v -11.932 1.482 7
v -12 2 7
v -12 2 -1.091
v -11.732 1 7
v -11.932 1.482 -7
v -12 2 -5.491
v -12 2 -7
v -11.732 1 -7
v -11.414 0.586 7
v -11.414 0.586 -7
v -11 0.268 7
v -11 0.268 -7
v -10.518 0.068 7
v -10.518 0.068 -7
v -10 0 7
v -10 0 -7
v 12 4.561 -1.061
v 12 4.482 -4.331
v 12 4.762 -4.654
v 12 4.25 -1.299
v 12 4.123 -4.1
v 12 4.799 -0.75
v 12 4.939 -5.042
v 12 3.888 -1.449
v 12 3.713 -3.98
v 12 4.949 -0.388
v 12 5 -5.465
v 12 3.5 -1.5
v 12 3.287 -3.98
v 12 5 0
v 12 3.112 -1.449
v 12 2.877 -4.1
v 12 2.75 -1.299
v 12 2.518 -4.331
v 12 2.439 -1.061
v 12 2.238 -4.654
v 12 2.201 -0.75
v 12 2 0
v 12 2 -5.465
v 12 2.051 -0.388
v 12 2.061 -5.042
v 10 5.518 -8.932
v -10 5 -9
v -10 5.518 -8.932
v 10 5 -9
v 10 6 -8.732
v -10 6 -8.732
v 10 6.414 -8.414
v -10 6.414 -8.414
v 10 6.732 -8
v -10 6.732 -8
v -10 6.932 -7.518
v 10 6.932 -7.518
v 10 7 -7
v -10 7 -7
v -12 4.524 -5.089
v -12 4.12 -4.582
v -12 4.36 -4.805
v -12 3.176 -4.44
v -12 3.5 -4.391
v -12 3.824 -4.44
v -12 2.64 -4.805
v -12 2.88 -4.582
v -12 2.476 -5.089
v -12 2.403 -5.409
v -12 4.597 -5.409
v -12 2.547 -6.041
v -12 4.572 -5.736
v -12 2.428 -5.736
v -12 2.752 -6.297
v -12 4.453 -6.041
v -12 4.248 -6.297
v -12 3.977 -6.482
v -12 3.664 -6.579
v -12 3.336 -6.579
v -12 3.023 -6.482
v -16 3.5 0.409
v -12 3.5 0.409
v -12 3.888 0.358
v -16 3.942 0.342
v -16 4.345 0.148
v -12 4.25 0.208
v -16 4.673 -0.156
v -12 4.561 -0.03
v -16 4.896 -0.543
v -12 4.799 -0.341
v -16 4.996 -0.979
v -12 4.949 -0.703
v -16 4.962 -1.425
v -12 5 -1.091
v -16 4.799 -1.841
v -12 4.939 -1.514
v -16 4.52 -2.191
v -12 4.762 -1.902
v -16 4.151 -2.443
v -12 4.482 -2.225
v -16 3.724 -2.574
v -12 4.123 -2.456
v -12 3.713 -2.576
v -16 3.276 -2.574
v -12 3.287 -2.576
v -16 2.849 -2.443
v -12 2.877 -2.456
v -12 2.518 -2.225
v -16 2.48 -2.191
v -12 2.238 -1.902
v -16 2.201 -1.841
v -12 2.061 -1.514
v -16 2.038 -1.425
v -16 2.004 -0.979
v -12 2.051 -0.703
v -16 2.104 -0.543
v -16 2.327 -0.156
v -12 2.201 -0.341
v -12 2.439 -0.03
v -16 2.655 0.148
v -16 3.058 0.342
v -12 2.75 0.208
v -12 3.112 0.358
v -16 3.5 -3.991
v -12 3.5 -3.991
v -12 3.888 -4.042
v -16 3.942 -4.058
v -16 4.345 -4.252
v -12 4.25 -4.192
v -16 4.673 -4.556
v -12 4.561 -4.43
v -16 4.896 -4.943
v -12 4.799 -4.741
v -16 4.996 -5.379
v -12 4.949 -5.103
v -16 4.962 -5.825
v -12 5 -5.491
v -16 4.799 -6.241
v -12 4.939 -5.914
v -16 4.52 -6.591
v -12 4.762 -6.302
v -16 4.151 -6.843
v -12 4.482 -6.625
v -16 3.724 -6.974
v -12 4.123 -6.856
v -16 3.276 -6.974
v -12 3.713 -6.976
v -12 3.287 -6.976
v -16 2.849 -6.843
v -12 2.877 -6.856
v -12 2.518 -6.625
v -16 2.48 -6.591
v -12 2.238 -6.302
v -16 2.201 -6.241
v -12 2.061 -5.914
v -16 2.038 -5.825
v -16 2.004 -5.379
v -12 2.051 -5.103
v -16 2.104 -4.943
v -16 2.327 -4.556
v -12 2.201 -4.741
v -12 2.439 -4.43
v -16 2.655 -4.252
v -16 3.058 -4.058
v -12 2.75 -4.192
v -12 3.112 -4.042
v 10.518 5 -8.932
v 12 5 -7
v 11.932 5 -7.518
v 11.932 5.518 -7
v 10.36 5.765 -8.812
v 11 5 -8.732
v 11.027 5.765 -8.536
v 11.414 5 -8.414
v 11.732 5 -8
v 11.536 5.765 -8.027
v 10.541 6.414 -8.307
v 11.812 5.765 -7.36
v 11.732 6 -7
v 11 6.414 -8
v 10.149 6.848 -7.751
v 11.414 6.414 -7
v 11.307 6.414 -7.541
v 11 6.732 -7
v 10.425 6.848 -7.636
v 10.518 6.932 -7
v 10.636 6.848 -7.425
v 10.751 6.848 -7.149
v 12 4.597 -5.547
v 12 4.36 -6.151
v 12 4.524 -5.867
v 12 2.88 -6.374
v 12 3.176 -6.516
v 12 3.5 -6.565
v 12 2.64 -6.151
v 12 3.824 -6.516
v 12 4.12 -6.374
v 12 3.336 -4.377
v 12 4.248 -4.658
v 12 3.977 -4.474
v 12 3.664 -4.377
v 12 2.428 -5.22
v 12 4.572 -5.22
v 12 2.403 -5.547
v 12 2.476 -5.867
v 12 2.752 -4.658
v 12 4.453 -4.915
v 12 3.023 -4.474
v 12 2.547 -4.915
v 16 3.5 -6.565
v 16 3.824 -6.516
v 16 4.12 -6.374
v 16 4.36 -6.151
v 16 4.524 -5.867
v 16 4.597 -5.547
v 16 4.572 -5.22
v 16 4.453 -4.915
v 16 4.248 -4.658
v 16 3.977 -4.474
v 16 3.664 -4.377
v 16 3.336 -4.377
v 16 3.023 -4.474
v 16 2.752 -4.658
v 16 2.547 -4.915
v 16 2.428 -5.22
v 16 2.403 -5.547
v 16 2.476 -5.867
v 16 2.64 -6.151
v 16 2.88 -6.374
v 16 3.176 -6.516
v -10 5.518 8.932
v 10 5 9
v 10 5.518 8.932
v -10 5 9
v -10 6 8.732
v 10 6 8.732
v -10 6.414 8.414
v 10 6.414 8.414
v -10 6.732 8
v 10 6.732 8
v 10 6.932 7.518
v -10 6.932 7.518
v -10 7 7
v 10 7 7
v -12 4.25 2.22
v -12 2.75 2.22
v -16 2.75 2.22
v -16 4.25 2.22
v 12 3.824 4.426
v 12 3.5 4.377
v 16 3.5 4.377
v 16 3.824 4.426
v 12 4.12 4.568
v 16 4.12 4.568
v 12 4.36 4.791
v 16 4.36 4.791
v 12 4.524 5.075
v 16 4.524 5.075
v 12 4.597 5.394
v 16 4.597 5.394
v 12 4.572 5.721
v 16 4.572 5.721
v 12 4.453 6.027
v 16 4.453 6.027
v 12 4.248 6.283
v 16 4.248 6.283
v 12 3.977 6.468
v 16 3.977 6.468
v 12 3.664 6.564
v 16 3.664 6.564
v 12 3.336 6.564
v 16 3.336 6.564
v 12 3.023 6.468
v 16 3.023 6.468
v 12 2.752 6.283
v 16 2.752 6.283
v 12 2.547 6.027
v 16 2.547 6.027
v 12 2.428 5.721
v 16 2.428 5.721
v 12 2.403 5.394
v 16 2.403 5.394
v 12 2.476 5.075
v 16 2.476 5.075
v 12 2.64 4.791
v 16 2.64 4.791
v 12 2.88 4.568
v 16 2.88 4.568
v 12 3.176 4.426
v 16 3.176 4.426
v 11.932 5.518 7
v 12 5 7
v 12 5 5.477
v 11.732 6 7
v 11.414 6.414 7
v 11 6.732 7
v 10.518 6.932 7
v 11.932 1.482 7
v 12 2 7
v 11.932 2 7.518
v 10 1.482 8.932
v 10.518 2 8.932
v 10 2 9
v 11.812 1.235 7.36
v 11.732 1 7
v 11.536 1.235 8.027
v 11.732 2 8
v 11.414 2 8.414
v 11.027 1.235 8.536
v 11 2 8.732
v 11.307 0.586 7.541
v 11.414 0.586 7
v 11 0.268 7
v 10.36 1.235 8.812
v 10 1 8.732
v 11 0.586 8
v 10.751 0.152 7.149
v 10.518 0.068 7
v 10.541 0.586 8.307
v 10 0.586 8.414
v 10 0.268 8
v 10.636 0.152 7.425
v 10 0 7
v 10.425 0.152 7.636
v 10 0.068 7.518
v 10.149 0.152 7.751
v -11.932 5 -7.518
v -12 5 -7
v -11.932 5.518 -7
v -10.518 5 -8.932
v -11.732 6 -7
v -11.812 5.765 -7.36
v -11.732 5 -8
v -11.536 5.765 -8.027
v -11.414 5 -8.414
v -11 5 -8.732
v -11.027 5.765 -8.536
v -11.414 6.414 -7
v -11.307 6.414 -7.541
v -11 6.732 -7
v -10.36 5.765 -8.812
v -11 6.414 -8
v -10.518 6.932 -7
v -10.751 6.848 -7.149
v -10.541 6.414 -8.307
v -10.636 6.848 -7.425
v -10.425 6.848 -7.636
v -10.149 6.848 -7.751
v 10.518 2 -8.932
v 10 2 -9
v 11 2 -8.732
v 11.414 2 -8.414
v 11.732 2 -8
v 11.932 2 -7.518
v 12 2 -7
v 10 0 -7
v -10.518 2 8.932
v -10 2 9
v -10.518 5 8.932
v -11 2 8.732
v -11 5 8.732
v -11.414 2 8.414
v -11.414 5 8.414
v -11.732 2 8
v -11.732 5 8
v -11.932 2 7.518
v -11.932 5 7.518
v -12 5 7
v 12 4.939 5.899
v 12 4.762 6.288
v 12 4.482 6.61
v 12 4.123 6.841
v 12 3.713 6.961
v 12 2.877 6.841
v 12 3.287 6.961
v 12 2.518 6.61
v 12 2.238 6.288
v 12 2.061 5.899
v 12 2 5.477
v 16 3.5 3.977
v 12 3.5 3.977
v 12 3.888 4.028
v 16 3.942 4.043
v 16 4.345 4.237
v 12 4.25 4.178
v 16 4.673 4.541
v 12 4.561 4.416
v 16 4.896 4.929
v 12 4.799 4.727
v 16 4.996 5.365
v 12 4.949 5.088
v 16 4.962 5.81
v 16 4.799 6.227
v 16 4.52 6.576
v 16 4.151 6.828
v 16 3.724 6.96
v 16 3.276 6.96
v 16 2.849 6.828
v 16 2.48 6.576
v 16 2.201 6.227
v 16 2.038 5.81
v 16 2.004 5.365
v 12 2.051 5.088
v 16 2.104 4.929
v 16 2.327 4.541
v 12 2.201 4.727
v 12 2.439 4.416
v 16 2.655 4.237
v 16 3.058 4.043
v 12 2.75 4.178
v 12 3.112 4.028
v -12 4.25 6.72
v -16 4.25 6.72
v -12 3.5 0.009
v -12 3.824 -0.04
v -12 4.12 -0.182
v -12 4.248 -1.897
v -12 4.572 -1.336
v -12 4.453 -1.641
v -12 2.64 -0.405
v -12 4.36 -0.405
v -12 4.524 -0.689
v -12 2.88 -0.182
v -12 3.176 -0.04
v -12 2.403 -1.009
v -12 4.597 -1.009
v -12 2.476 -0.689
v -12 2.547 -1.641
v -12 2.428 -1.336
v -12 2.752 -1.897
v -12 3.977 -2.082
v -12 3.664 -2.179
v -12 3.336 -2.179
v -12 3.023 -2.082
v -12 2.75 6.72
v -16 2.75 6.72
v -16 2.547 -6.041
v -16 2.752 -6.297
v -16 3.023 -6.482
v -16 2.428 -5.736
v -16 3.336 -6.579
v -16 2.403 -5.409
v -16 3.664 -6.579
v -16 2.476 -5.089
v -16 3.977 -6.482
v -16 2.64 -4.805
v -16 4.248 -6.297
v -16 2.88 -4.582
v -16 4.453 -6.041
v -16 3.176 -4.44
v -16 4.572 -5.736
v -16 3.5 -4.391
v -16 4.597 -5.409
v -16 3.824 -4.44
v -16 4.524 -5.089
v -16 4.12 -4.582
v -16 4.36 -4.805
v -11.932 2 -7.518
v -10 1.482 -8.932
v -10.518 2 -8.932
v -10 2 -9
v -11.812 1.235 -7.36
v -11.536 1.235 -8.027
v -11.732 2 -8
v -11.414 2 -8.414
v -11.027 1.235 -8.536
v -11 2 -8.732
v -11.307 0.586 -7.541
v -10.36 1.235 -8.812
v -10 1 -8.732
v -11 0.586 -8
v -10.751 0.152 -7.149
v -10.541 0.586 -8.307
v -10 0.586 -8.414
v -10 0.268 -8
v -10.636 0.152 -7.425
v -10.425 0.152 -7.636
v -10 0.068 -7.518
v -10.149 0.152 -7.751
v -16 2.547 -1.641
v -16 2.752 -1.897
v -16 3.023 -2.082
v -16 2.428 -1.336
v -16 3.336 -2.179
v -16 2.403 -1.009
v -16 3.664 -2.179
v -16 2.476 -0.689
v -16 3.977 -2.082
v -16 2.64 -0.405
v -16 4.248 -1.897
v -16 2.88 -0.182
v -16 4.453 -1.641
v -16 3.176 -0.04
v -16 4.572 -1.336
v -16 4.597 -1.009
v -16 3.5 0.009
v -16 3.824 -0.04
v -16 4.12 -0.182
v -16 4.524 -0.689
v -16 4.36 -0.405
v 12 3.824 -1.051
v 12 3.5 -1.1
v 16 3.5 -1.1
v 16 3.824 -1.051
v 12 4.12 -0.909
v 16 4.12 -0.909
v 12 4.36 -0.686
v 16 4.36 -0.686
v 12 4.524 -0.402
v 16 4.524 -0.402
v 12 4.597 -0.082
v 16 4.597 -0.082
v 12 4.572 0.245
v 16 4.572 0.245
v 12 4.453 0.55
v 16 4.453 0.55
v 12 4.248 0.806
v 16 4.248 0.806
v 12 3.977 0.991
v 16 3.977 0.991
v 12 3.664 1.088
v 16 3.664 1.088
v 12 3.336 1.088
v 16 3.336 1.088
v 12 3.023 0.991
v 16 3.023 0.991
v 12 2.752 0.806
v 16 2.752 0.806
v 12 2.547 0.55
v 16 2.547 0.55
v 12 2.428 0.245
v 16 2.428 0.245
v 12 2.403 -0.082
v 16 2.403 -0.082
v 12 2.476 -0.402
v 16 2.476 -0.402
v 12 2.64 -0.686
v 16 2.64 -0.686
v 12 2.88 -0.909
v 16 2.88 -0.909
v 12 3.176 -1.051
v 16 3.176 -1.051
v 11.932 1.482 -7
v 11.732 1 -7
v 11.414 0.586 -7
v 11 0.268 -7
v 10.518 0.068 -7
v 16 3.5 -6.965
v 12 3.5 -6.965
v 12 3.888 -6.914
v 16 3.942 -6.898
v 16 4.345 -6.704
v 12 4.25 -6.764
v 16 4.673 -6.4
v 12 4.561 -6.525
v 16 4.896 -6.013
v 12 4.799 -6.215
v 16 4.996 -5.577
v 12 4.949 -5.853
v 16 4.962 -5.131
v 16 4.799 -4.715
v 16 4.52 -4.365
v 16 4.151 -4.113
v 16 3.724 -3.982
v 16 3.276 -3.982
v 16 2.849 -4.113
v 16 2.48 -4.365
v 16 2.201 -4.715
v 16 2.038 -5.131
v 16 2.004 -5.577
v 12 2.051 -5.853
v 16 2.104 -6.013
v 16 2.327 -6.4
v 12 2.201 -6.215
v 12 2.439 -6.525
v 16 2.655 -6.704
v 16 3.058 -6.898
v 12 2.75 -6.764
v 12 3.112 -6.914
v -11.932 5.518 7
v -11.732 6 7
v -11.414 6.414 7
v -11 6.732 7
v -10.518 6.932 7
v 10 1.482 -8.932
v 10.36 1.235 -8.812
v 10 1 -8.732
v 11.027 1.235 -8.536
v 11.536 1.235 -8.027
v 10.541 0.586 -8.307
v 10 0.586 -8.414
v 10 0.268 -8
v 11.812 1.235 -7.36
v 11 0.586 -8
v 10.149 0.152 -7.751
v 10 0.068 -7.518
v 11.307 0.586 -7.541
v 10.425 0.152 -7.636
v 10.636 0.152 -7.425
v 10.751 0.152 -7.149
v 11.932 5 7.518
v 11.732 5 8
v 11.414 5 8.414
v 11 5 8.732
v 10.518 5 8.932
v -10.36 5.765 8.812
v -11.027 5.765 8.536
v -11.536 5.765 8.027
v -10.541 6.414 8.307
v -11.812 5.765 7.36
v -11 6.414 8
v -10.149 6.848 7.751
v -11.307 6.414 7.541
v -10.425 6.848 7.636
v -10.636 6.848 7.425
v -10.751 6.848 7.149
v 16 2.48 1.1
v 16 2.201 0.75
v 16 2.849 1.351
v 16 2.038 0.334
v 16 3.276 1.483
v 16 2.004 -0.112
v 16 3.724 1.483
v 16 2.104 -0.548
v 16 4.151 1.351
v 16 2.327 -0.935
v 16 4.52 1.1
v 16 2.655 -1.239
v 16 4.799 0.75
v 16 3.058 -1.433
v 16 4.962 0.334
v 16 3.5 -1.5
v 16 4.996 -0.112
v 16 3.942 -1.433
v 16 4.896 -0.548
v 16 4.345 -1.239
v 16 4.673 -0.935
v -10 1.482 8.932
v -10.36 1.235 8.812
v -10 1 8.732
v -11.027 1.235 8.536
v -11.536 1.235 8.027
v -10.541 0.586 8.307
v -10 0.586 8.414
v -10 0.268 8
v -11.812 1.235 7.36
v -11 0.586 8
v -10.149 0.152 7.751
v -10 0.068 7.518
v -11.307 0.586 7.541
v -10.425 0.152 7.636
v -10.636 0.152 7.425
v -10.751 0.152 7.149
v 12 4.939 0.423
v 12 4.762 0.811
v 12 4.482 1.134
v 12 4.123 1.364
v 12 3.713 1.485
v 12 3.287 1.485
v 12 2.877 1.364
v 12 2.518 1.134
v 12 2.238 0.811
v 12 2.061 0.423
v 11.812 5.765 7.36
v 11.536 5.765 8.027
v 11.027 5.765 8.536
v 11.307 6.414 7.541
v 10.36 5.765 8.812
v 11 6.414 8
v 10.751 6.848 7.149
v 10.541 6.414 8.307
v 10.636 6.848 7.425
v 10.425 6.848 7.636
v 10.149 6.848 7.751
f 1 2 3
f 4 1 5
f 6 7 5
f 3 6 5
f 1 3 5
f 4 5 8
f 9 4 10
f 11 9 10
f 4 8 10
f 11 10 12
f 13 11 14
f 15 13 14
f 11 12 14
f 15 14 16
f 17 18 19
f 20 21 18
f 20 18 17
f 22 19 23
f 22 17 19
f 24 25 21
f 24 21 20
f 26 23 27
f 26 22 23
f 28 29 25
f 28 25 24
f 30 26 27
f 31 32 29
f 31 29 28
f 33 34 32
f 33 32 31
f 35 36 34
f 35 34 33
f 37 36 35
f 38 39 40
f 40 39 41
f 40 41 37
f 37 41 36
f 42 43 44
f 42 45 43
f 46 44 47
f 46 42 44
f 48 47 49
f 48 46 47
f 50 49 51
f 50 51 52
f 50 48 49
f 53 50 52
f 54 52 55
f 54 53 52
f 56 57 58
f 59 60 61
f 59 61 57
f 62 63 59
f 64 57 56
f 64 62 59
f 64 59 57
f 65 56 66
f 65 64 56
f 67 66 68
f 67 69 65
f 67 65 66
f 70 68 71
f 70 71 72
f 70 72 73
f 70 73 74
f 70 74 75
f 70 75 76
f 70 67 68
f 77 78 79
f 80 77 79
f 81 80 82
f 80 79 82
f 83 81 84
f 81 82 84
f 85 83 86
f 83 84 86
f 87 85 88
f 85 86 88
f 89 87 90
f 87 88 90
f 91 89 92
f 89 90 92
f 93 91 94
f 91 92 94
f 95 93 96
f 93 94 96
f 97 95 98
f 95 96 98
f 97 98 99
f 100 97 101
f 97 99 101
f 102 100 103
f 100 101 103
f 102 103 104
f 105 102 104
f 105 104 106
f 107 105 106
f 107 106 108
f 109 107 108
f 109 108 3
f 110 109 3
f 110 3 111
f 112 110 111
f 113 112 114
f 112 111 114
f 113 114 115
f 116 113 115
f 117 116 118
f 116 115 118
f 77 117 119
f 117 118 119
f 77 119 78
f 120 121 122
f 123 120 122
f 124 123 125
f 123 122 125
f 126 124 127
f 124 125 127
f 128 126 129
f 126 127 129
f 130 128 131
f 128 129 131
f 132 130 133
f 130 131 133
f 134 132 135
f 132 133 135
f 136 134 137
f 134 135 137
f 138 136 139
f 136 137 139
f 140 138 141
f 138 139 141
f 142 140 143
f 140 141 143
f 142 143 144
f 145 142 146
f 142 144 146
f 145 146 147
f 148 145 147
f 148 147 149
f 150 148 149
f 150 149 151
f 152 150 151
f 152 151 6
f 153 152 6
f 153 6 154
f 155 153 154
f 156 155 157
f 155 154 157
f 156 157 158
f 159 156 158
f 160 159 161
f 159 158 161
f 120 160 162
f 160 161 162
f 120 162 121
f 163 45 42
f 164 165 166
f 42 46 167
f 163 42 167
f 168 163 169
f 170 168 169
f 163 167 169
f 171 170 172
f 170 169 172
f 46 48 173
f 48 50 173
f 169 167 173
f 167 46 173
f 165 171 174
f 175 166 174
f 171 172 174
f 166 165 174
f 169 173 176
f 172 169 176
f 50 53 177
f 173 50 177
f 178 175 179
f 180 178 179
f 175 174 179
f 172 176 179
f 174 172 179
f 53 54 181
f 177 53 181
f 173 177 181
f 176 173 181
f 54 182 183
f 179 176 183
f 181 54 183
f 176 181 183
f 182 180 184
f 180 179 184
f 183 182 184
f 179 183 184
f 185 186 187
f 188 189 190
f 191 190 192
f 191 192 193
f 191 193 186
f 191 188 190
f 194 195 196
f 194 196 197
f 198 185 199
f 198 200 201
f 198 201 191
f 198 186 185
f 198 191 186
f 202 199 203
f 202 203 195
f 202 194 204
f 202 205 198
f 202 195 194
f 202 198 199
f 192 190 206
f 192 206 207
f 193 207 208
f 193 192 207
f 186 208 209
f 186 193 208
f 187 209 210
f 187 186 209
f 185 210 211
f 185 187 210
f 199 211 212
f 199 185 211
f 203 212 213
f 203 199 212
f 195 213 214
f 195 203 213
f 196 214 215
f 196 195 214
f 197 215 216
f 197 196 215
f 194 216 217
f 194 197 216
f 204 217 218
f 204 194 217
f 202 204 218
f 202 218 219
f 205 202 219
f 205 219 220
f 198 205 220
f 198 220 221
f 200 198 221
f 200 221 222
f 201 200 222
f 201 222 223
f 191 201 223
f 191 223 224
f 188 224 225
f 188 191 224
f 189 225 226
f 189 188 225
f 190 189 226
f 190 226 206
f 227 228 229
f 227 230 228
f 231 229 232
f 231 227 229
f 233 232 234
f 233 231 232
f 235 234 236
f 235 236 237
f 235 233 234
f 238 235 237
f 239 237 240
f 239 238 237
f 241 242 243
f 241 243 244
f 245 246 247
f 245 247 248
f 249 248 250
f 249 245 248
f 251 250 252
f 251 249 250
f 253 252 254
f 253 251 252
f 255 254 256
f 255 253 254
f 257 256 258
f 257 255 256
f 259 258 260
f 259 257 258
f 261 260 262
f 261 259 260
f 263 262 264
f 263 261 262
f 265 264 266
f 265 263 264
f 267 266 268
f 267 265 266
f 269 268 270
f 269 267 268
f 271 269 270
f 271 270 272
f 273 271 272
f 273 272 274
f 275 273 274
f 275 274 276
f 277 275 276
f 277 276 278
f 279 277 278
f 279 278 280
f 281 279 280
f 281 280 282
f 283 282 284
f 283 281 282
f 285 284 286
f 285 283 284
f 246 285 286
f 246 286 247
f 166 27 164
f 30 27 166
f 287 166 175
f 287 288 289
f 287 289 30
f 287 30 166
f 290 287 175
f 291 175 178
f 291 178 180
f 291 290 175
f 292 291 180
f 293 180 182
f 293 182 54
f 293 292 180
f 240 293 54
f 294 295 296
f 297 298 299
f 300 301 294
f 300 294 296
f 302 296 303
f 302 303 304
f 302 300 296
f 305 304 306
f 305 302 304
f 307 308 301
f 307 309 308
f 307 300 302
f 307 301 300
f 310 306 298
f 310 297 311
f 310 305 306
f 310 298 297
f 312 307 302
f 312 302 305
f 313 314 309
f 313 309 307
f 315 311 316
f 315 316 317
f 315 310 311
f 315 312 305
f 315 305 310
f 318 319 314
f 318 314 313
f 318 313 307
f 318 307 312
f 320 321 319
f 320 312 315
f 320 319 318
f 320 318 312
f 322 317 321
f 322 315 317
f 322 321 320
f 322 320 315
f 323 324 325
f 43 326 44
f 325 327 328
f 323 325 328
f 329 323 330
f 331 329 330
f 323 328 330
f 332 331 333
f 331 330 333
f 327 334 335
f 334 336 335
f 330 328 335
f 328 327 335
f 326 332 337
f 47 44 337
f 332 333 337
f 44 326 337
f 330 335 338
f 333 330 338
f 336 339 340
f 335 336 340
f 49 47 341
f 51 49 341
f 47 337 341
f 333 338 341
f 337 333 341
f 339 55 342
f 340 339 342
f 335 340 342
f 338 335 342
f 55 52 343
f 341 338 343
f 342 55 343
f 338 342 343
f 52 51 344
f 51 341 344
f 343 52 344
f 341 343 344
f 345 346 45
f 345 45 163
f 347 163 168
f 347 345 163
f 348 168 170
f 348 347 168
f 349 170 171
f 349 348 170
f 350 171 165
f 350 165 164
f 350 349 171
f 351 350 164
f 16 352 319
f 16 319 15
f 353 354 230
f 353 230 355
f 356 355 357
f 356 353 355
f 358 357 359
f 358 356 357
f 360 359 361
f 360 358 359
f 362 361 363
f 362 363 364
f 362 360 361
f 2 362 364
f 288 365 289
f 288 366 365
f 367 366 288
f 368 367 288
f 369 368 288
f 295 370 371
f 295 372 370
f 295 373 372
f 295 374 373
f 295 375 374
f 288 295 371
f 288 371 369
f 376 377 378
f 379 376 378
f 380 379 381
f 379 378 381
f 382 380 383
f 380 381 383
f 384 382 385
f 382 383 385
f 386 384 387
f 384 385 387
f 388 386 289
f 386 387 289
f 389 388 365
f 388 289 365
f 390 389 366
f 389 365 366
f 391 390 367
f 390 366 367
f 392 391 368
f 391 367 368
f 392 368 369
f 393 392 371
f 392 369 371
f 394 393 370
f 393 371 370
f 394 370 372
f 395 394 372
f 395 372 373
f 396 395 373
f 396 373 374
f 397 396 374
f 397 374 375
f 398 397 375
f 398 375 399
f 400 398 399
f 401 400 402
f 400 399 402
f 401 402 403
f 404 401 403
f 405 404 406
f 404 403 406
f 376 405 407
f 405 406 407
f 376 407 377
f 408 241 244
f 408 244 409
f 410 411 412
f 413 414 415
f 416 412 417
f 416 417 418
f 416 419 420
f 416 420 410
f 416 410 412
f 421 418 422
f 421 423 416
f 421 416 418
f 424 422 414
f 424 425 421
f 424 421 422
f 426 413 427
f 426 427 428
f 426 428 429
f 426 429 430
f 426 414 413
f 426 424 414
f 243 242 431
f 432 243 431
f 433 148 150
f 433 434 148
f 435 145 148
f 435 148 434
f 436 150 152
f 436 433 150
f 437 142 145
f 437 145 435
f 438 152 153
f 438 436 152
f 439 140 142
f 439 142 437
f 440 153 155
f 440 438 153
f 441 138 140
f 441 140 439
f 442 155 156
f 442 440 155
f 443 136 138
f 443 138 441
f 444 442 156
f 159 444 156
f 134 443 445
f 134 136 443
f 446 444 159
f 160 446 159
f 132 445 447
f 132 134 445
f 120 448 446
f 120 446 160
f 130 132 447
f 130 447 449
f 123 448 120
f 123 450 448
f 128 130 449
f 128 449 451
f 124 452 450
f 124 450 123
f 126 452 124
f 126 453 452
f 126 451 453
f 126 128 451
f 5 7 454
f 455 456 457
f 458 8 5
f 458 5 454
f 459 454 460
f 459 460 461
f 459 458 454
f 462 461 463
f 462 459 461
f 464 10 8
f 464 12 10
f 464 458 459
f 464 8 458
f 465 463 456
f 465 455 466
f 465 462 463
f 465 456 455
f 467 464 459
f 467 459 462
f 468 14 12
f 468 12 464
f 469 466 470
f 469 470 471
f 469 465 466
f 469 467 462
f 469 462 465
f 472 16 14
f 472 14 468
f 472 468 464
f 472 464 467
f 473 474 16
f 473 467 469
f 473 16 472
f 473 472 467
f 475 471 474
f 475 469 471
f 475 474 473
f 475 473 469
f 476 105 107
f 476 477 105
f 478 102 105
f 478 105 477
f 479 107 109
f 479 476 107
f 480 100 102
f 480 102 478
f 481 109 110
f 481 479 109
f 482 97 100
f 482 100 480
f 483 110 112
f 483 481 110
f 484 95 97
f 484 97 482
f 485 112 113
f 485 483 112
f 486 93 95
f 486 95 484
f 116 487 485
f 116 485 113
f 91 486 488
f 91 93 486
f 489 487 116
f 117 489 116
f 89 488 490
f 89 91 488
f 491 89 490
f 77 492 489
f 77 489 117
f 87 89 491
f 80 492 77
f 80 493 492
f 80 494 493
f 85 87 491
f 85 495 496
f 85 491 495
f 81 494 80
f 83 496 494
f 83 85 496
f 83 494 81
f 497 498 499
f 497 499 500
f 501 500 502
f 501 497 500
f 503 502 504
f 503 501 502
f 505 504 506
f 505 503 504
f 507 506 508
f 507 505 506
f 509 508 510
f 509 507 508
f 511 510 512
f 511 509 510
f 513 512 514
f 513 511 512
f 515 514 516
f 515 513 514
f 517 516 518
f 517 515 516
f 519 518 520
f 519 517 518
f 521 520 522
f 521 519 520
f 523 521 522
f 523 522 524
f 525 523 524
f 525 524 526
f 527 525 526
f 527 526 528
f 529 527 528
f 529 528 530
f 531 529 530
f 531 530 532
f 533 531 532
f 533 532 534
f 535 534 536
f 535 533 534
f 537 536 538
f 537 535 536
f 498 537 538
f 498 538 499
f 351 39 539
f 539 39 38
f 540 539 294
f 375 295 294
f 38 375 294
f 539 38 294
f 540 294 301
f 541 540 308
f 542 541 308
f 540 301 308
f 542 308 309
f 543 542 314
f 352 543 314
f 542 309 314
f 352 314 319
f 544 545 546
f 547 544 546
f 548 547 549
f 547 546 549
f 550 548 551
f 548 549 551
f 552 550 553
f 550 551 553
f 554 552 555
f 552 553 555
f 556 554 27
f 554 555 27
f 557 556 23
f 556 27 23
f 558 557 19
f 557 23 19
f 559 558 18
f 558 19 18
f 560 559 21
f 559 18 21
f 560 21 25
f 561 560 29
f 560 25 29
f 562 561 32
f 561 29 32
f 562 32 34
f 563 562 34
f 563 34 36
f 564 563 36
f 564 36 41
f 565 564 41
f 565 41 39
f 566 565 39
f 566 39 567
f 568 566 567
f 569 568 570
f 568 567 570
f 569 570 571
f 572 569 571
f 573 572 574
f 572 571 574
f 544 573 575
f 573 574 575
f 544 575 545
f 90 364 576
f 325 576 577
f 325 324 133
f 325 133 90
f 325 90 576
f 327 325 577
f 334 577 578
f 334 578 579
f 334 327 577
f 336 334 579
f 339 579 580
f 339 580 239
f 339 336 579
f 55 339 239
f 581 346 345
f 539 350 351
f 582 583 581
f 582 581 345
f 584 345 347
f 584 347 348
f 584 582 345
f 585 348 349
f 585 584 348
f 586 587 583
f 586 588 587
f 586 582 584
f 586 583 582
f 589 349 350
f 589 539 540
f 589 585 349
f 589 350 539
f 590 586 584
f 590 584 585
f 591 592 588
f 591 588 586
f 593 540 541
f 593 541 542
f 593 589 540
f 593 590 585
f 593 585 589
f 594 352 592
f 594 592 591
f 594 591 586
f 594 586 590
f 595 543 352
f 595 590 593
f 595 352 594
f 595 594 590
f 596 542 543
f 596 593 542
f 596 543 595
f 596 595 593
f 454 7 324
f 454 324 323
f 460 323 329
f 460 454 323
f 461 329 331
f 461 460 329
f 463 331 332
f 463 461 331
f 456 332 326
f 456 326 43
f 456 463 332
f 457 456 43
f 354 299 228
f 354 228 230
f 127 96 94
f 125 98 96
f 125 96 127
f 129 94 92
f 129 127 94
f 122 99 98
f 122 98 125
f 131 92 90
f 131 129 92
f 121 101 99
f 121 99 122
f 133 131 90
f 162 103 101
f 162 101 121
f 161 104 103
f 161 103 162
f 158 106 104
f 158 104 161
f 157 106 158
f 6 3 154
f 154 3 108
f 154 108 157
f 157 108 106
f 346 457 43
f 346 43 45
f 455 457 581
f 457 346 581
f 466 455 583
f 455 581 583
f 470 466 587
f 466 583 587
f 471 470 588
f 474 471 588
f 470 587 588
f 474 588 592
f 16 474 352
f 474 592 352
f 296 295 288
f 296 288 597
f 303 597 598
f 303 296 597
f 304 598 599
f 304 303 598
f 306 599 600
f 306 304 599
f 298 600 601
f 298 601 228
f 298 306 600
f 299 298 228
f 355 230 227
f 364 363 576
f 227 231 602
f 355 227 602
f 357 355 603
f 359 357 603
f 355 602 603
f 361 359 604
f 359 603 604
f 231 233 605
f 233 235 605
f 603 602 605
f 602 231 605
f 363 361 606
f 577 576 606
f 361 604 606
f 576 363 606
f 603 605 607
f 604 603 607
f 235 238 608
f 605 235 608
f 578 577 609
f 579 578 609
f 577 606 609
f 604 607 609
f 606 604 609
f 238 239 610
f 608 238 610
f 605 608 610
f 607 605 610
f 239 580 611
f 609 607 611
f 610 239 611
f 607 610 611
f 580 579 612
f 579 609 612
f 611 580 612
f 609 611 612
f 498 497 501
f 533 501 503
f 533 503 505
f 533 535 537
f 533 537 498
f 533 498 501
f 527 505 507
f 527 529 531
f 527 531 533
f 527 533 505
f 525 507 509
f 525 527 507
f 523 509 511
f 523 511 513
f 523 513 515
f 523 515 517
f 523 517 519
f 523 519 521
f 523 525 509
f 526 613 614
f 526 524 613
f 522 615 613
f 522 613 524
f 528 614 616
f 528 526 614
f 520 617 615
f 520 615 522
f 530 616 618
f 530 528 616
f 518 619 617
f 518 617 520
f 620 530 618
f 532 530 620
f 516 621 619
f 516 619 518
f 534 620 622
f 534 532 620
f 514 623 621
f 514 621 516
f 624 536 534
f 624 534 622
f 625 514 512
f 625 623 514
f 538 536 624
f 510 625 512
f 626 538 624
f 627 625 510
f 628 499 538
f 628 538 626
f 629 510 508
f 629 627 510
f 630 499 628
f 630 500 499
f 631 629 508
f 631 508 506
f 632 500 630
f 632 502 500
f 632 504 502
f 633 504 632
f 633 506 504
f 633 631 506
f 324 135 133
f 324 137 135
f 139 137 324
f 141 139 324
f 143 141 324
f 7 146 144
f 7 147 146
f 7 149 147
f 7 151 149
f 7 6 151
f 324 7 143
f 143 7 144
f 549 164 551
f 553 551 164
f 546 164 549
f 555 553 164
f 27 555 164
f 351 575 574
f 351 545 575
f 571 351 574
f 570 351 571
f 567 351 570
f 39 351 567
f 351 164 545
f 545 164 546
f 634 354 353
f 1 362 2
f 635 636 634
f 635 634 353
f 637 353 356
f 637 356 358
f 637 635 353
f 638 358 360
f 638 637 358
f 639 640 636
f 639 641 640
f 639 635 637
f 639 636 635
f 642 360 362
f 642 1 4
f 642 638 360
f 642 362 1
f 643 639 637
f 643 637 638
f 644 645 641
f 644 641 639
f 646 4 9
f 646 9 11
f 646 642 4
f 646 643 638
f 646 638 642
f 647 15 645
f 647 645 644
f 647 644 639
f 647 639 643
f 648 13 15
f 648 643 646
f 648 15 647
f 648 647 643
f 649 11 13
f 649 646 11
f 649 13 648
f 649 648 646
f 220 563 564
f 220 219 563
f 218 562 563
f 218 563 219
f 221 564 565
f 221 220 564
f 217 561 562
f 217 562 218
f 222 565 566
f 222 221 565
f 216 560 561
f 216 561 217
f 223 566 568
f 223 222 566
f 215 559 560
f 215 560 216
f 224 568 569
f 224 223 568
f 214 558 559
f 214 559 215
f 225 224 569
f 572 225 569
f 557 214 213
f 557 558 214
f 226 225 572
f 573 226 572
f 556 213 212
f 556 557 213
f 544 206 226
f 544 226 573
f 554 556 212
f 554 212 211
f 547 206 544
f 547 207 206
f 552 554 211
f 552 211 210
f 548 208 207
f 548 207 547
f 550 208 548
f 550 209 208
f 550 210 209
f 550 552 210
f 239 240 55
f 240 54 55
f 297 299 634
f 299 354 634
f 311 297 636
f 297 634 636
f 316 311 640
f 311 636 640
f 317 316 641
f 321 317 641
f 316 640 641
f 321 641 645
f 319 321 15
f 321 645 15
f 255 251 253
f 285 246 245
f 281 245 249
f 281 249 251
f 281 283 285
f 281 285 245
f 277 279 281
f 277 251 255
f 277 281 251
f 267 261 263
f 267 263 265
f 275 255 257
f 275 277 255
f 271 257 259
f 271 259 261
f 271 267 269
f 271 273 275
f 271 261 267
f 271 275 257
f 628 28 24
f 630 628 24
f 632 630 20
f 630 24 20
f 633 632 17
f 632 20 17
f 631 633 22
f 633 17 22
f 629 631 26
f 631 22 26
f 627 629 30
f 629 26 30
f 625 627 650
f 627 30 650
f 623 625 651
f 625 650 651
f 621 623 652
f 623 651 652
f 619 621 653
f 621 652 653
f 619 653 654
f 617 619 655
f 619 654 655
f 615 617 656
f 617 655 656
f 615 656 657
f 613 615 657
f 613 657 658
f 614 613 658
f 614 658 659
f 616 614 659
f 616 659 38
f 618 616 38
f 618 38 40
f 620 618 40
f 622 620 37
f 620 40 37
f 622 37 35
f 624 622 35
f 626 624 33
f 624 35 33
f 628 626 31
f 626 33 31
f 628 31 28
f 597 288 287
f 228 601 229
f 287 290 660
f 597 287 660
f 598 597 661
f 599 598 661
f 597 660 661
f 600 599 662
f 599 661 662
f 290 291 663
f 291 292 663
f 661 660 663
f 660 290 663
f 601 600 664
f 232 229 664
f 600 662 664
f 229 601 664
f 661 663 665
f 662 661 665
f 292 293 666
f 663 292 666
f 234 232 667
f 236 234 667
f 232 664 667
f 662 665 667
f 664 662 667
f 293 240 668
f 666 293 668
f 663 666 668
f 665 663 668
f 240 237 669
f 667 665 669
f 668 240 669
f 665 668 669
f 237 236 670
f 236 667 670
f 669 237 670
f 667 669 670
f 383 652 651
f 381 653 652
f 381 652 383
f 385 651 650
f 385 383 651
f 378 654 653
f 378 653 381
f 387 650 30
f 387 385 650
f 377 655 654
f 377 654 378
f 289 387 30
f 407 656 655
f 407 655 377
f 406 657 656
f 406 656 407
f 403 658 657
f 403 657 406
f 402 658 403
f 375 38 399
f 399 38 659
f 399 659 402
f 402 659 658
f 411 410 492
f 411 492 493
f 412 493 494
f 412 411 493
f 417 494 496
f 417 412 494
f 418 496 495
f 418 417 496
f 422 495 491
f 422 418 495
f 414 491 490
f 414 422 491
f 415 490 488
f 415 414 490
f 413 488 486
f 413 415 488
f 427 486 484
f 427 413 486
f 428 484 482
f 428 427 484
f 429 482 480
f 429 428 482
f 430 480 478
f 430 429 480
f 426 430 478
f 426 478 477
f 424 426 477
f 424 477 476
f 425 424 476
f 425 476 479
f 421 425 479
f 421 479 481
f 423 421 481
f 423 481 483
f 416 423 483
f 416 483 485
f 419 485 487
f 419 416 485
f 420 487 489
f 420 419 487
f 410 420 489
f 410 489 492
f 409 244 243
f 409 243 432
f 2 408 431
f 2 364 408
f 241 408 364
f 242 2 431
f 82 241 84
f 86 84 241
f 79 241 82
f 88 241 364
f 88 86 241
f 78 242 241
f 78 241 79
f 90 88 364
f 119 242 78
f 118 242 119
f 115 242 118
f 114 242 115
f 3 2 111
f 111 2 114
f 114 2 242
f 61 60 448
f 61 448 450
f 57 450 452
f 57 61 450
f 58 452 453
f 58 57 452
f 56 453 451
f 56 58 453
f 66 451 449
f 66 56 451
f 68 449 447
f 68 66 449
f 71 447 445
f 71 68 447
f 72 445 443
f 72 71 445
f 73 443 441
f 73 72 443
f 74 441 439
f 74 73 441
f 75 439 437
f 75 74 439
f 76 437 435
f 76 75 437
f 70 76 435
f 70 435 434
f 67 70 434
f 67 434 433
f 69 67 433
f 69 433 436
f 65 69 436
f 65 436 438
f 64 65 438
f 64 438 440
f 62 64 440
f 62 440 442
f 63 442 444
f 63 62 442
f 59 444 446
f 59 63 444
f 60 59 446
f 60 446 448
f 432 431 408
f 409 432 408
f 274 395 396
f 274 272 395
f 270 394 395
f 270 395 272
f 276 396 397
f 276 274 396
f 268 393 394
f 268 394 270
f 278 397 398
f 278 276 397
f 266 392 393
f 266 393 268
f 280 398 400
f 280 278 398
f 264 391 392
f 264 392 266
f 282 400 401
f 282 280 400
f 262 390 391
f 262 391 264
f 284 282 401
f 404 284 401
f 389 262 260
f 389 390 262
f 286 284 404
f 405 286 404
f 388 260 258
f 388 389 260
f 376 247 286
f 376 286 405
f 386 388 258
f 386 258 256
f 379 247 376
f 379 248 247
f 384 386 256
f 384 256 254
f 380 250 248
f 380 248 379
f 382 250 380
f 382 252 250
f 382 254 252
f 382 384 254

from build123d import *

# Parameters (mm, degrees)
BOSS_EXTRUDE1_DEPTH = 7
FILLET1_R           = 2
SKETCH2_R           = 1.5
SKETCH2_R_2         = 1.1
BOSS_EXTRUDE2_DEPTH = 4
SKETCH3_R           = 1.5
SKETCH3_R_2         = 1.1
SKETCH3_W           = 4.5
SKETCH3_H           = 1.5
BOSS_EXTRUDE3_DEPTH = 4


with BuildPart() as part:
    # Sketch1 → Boss-Extrude1 (new body)
    with BuildSketch(Plane(origin=(0, 0, 0), x_dir=(1, 0, 0), z_dir=(0, 1, 0))):
        with BuildLine():
            Line((10, -9), (-10, -9))
            ThreePointArc((-10, -9), (-11.414213562, -8.414213562), (-12, -7))
            Line((-12, -7), (-12, 7))
            ThreePointArc((-12, 7), (-11.414213562, 8.414213562), (-10, 9))
            Line((-10, 9), (10, 9))
            ThreePointArc((10, 9), (11.414213562, 8.414213562), (12, 7))
            Line((12, 7), (12, -7))
            ThreePointArc((12, -7), (11.414213562, -8.414213562), (10, -9))
        make_face()
    extrude(amount=BOSS_EXTRUDE1_DEPTH)

    # Fillet1
    fillet1_edges = [part.edges().sort_by_distance(p)[0] for p in [
        (12, 0, 0),
        (11.414213562, 0, 8.414213562),
        (0, 0, 9),
        (-11.414213562, 0, 8.414213562),
        (11.414213562, 7, 8.414213562),
        (12, 7, 0),
        (11.414213562, 7, -8.414213562),
        (0, 7, -9),
        (-11.414213562, 7, -8.414213562),
        (-12, 7, 0),
        (-11.414213562, 7, 8.414213562),
        (-12, 0, 0),
        (0, 7, 9),
        (-11.414213562, 0, -8.414213562),
        (0, 0, -9),
        (11.414213562, 0, -8.414213562),
    ]]
    fillet(fillet1_edges, radius=FILLET1_R)

    # Sketch2 → Boss-Extrude2 (add)
    with BuildSketch(Plane(origin=(12, 0, 0), x_dir=(0, 0, -1), z_dir=(1, 0, 0))):
        with Locations((0, 3.5)):
            Circle(SKETCH2_R)
        with Locations((0, 3.5)):
            Circle(SKETCH2_R_2, mode=Mode.SUBTRACT)
        with Locations((-5.476648667, 3.5)):
            Circle(SKETCH2_R)
        with Locations((-5.476648667, 3.5)):
            Circle(SKETCH2_R_2, mode=Mode.SUBTRACT)
        with Locations((5.464786958, 3.5)):
            Circle(SKETCH2_R)
        with Locations((5.464786958, 3.5)):
            Circle(SKETCH2_R_2, mode=Mode.SUBTRACT)
    extrude(amount=BOSS_EXTRUDE2_DEPTH)

    # Sketch3 → Boss-Extrude3 (add)
    with BuildSketch(Plane.ZY.offset(12)):
        with Locations((-1.091059361, 3.5)):
            Circle(SKETCH3_R)
        with Locations((-1.091059361, 3.5)):
            Circle(SKETCH3_R_2, mode=Mode.SUBTRACT)
        with Locations((-5.491059361, 3.5)):
            Circle(SKETCH3_R)
        with Locations((-5.491059361, 3.5)):
            Circle(SKETCH3_R_2, mode=Mode.SUBTRACT)
        with Locations((4.47030055, 3.5)):
            Rectangle(SKETCH3_W, SKETCH3_H)
    extrude(amount=BOSS_EXTRUDE3_DEPTH)


solid = part.part
